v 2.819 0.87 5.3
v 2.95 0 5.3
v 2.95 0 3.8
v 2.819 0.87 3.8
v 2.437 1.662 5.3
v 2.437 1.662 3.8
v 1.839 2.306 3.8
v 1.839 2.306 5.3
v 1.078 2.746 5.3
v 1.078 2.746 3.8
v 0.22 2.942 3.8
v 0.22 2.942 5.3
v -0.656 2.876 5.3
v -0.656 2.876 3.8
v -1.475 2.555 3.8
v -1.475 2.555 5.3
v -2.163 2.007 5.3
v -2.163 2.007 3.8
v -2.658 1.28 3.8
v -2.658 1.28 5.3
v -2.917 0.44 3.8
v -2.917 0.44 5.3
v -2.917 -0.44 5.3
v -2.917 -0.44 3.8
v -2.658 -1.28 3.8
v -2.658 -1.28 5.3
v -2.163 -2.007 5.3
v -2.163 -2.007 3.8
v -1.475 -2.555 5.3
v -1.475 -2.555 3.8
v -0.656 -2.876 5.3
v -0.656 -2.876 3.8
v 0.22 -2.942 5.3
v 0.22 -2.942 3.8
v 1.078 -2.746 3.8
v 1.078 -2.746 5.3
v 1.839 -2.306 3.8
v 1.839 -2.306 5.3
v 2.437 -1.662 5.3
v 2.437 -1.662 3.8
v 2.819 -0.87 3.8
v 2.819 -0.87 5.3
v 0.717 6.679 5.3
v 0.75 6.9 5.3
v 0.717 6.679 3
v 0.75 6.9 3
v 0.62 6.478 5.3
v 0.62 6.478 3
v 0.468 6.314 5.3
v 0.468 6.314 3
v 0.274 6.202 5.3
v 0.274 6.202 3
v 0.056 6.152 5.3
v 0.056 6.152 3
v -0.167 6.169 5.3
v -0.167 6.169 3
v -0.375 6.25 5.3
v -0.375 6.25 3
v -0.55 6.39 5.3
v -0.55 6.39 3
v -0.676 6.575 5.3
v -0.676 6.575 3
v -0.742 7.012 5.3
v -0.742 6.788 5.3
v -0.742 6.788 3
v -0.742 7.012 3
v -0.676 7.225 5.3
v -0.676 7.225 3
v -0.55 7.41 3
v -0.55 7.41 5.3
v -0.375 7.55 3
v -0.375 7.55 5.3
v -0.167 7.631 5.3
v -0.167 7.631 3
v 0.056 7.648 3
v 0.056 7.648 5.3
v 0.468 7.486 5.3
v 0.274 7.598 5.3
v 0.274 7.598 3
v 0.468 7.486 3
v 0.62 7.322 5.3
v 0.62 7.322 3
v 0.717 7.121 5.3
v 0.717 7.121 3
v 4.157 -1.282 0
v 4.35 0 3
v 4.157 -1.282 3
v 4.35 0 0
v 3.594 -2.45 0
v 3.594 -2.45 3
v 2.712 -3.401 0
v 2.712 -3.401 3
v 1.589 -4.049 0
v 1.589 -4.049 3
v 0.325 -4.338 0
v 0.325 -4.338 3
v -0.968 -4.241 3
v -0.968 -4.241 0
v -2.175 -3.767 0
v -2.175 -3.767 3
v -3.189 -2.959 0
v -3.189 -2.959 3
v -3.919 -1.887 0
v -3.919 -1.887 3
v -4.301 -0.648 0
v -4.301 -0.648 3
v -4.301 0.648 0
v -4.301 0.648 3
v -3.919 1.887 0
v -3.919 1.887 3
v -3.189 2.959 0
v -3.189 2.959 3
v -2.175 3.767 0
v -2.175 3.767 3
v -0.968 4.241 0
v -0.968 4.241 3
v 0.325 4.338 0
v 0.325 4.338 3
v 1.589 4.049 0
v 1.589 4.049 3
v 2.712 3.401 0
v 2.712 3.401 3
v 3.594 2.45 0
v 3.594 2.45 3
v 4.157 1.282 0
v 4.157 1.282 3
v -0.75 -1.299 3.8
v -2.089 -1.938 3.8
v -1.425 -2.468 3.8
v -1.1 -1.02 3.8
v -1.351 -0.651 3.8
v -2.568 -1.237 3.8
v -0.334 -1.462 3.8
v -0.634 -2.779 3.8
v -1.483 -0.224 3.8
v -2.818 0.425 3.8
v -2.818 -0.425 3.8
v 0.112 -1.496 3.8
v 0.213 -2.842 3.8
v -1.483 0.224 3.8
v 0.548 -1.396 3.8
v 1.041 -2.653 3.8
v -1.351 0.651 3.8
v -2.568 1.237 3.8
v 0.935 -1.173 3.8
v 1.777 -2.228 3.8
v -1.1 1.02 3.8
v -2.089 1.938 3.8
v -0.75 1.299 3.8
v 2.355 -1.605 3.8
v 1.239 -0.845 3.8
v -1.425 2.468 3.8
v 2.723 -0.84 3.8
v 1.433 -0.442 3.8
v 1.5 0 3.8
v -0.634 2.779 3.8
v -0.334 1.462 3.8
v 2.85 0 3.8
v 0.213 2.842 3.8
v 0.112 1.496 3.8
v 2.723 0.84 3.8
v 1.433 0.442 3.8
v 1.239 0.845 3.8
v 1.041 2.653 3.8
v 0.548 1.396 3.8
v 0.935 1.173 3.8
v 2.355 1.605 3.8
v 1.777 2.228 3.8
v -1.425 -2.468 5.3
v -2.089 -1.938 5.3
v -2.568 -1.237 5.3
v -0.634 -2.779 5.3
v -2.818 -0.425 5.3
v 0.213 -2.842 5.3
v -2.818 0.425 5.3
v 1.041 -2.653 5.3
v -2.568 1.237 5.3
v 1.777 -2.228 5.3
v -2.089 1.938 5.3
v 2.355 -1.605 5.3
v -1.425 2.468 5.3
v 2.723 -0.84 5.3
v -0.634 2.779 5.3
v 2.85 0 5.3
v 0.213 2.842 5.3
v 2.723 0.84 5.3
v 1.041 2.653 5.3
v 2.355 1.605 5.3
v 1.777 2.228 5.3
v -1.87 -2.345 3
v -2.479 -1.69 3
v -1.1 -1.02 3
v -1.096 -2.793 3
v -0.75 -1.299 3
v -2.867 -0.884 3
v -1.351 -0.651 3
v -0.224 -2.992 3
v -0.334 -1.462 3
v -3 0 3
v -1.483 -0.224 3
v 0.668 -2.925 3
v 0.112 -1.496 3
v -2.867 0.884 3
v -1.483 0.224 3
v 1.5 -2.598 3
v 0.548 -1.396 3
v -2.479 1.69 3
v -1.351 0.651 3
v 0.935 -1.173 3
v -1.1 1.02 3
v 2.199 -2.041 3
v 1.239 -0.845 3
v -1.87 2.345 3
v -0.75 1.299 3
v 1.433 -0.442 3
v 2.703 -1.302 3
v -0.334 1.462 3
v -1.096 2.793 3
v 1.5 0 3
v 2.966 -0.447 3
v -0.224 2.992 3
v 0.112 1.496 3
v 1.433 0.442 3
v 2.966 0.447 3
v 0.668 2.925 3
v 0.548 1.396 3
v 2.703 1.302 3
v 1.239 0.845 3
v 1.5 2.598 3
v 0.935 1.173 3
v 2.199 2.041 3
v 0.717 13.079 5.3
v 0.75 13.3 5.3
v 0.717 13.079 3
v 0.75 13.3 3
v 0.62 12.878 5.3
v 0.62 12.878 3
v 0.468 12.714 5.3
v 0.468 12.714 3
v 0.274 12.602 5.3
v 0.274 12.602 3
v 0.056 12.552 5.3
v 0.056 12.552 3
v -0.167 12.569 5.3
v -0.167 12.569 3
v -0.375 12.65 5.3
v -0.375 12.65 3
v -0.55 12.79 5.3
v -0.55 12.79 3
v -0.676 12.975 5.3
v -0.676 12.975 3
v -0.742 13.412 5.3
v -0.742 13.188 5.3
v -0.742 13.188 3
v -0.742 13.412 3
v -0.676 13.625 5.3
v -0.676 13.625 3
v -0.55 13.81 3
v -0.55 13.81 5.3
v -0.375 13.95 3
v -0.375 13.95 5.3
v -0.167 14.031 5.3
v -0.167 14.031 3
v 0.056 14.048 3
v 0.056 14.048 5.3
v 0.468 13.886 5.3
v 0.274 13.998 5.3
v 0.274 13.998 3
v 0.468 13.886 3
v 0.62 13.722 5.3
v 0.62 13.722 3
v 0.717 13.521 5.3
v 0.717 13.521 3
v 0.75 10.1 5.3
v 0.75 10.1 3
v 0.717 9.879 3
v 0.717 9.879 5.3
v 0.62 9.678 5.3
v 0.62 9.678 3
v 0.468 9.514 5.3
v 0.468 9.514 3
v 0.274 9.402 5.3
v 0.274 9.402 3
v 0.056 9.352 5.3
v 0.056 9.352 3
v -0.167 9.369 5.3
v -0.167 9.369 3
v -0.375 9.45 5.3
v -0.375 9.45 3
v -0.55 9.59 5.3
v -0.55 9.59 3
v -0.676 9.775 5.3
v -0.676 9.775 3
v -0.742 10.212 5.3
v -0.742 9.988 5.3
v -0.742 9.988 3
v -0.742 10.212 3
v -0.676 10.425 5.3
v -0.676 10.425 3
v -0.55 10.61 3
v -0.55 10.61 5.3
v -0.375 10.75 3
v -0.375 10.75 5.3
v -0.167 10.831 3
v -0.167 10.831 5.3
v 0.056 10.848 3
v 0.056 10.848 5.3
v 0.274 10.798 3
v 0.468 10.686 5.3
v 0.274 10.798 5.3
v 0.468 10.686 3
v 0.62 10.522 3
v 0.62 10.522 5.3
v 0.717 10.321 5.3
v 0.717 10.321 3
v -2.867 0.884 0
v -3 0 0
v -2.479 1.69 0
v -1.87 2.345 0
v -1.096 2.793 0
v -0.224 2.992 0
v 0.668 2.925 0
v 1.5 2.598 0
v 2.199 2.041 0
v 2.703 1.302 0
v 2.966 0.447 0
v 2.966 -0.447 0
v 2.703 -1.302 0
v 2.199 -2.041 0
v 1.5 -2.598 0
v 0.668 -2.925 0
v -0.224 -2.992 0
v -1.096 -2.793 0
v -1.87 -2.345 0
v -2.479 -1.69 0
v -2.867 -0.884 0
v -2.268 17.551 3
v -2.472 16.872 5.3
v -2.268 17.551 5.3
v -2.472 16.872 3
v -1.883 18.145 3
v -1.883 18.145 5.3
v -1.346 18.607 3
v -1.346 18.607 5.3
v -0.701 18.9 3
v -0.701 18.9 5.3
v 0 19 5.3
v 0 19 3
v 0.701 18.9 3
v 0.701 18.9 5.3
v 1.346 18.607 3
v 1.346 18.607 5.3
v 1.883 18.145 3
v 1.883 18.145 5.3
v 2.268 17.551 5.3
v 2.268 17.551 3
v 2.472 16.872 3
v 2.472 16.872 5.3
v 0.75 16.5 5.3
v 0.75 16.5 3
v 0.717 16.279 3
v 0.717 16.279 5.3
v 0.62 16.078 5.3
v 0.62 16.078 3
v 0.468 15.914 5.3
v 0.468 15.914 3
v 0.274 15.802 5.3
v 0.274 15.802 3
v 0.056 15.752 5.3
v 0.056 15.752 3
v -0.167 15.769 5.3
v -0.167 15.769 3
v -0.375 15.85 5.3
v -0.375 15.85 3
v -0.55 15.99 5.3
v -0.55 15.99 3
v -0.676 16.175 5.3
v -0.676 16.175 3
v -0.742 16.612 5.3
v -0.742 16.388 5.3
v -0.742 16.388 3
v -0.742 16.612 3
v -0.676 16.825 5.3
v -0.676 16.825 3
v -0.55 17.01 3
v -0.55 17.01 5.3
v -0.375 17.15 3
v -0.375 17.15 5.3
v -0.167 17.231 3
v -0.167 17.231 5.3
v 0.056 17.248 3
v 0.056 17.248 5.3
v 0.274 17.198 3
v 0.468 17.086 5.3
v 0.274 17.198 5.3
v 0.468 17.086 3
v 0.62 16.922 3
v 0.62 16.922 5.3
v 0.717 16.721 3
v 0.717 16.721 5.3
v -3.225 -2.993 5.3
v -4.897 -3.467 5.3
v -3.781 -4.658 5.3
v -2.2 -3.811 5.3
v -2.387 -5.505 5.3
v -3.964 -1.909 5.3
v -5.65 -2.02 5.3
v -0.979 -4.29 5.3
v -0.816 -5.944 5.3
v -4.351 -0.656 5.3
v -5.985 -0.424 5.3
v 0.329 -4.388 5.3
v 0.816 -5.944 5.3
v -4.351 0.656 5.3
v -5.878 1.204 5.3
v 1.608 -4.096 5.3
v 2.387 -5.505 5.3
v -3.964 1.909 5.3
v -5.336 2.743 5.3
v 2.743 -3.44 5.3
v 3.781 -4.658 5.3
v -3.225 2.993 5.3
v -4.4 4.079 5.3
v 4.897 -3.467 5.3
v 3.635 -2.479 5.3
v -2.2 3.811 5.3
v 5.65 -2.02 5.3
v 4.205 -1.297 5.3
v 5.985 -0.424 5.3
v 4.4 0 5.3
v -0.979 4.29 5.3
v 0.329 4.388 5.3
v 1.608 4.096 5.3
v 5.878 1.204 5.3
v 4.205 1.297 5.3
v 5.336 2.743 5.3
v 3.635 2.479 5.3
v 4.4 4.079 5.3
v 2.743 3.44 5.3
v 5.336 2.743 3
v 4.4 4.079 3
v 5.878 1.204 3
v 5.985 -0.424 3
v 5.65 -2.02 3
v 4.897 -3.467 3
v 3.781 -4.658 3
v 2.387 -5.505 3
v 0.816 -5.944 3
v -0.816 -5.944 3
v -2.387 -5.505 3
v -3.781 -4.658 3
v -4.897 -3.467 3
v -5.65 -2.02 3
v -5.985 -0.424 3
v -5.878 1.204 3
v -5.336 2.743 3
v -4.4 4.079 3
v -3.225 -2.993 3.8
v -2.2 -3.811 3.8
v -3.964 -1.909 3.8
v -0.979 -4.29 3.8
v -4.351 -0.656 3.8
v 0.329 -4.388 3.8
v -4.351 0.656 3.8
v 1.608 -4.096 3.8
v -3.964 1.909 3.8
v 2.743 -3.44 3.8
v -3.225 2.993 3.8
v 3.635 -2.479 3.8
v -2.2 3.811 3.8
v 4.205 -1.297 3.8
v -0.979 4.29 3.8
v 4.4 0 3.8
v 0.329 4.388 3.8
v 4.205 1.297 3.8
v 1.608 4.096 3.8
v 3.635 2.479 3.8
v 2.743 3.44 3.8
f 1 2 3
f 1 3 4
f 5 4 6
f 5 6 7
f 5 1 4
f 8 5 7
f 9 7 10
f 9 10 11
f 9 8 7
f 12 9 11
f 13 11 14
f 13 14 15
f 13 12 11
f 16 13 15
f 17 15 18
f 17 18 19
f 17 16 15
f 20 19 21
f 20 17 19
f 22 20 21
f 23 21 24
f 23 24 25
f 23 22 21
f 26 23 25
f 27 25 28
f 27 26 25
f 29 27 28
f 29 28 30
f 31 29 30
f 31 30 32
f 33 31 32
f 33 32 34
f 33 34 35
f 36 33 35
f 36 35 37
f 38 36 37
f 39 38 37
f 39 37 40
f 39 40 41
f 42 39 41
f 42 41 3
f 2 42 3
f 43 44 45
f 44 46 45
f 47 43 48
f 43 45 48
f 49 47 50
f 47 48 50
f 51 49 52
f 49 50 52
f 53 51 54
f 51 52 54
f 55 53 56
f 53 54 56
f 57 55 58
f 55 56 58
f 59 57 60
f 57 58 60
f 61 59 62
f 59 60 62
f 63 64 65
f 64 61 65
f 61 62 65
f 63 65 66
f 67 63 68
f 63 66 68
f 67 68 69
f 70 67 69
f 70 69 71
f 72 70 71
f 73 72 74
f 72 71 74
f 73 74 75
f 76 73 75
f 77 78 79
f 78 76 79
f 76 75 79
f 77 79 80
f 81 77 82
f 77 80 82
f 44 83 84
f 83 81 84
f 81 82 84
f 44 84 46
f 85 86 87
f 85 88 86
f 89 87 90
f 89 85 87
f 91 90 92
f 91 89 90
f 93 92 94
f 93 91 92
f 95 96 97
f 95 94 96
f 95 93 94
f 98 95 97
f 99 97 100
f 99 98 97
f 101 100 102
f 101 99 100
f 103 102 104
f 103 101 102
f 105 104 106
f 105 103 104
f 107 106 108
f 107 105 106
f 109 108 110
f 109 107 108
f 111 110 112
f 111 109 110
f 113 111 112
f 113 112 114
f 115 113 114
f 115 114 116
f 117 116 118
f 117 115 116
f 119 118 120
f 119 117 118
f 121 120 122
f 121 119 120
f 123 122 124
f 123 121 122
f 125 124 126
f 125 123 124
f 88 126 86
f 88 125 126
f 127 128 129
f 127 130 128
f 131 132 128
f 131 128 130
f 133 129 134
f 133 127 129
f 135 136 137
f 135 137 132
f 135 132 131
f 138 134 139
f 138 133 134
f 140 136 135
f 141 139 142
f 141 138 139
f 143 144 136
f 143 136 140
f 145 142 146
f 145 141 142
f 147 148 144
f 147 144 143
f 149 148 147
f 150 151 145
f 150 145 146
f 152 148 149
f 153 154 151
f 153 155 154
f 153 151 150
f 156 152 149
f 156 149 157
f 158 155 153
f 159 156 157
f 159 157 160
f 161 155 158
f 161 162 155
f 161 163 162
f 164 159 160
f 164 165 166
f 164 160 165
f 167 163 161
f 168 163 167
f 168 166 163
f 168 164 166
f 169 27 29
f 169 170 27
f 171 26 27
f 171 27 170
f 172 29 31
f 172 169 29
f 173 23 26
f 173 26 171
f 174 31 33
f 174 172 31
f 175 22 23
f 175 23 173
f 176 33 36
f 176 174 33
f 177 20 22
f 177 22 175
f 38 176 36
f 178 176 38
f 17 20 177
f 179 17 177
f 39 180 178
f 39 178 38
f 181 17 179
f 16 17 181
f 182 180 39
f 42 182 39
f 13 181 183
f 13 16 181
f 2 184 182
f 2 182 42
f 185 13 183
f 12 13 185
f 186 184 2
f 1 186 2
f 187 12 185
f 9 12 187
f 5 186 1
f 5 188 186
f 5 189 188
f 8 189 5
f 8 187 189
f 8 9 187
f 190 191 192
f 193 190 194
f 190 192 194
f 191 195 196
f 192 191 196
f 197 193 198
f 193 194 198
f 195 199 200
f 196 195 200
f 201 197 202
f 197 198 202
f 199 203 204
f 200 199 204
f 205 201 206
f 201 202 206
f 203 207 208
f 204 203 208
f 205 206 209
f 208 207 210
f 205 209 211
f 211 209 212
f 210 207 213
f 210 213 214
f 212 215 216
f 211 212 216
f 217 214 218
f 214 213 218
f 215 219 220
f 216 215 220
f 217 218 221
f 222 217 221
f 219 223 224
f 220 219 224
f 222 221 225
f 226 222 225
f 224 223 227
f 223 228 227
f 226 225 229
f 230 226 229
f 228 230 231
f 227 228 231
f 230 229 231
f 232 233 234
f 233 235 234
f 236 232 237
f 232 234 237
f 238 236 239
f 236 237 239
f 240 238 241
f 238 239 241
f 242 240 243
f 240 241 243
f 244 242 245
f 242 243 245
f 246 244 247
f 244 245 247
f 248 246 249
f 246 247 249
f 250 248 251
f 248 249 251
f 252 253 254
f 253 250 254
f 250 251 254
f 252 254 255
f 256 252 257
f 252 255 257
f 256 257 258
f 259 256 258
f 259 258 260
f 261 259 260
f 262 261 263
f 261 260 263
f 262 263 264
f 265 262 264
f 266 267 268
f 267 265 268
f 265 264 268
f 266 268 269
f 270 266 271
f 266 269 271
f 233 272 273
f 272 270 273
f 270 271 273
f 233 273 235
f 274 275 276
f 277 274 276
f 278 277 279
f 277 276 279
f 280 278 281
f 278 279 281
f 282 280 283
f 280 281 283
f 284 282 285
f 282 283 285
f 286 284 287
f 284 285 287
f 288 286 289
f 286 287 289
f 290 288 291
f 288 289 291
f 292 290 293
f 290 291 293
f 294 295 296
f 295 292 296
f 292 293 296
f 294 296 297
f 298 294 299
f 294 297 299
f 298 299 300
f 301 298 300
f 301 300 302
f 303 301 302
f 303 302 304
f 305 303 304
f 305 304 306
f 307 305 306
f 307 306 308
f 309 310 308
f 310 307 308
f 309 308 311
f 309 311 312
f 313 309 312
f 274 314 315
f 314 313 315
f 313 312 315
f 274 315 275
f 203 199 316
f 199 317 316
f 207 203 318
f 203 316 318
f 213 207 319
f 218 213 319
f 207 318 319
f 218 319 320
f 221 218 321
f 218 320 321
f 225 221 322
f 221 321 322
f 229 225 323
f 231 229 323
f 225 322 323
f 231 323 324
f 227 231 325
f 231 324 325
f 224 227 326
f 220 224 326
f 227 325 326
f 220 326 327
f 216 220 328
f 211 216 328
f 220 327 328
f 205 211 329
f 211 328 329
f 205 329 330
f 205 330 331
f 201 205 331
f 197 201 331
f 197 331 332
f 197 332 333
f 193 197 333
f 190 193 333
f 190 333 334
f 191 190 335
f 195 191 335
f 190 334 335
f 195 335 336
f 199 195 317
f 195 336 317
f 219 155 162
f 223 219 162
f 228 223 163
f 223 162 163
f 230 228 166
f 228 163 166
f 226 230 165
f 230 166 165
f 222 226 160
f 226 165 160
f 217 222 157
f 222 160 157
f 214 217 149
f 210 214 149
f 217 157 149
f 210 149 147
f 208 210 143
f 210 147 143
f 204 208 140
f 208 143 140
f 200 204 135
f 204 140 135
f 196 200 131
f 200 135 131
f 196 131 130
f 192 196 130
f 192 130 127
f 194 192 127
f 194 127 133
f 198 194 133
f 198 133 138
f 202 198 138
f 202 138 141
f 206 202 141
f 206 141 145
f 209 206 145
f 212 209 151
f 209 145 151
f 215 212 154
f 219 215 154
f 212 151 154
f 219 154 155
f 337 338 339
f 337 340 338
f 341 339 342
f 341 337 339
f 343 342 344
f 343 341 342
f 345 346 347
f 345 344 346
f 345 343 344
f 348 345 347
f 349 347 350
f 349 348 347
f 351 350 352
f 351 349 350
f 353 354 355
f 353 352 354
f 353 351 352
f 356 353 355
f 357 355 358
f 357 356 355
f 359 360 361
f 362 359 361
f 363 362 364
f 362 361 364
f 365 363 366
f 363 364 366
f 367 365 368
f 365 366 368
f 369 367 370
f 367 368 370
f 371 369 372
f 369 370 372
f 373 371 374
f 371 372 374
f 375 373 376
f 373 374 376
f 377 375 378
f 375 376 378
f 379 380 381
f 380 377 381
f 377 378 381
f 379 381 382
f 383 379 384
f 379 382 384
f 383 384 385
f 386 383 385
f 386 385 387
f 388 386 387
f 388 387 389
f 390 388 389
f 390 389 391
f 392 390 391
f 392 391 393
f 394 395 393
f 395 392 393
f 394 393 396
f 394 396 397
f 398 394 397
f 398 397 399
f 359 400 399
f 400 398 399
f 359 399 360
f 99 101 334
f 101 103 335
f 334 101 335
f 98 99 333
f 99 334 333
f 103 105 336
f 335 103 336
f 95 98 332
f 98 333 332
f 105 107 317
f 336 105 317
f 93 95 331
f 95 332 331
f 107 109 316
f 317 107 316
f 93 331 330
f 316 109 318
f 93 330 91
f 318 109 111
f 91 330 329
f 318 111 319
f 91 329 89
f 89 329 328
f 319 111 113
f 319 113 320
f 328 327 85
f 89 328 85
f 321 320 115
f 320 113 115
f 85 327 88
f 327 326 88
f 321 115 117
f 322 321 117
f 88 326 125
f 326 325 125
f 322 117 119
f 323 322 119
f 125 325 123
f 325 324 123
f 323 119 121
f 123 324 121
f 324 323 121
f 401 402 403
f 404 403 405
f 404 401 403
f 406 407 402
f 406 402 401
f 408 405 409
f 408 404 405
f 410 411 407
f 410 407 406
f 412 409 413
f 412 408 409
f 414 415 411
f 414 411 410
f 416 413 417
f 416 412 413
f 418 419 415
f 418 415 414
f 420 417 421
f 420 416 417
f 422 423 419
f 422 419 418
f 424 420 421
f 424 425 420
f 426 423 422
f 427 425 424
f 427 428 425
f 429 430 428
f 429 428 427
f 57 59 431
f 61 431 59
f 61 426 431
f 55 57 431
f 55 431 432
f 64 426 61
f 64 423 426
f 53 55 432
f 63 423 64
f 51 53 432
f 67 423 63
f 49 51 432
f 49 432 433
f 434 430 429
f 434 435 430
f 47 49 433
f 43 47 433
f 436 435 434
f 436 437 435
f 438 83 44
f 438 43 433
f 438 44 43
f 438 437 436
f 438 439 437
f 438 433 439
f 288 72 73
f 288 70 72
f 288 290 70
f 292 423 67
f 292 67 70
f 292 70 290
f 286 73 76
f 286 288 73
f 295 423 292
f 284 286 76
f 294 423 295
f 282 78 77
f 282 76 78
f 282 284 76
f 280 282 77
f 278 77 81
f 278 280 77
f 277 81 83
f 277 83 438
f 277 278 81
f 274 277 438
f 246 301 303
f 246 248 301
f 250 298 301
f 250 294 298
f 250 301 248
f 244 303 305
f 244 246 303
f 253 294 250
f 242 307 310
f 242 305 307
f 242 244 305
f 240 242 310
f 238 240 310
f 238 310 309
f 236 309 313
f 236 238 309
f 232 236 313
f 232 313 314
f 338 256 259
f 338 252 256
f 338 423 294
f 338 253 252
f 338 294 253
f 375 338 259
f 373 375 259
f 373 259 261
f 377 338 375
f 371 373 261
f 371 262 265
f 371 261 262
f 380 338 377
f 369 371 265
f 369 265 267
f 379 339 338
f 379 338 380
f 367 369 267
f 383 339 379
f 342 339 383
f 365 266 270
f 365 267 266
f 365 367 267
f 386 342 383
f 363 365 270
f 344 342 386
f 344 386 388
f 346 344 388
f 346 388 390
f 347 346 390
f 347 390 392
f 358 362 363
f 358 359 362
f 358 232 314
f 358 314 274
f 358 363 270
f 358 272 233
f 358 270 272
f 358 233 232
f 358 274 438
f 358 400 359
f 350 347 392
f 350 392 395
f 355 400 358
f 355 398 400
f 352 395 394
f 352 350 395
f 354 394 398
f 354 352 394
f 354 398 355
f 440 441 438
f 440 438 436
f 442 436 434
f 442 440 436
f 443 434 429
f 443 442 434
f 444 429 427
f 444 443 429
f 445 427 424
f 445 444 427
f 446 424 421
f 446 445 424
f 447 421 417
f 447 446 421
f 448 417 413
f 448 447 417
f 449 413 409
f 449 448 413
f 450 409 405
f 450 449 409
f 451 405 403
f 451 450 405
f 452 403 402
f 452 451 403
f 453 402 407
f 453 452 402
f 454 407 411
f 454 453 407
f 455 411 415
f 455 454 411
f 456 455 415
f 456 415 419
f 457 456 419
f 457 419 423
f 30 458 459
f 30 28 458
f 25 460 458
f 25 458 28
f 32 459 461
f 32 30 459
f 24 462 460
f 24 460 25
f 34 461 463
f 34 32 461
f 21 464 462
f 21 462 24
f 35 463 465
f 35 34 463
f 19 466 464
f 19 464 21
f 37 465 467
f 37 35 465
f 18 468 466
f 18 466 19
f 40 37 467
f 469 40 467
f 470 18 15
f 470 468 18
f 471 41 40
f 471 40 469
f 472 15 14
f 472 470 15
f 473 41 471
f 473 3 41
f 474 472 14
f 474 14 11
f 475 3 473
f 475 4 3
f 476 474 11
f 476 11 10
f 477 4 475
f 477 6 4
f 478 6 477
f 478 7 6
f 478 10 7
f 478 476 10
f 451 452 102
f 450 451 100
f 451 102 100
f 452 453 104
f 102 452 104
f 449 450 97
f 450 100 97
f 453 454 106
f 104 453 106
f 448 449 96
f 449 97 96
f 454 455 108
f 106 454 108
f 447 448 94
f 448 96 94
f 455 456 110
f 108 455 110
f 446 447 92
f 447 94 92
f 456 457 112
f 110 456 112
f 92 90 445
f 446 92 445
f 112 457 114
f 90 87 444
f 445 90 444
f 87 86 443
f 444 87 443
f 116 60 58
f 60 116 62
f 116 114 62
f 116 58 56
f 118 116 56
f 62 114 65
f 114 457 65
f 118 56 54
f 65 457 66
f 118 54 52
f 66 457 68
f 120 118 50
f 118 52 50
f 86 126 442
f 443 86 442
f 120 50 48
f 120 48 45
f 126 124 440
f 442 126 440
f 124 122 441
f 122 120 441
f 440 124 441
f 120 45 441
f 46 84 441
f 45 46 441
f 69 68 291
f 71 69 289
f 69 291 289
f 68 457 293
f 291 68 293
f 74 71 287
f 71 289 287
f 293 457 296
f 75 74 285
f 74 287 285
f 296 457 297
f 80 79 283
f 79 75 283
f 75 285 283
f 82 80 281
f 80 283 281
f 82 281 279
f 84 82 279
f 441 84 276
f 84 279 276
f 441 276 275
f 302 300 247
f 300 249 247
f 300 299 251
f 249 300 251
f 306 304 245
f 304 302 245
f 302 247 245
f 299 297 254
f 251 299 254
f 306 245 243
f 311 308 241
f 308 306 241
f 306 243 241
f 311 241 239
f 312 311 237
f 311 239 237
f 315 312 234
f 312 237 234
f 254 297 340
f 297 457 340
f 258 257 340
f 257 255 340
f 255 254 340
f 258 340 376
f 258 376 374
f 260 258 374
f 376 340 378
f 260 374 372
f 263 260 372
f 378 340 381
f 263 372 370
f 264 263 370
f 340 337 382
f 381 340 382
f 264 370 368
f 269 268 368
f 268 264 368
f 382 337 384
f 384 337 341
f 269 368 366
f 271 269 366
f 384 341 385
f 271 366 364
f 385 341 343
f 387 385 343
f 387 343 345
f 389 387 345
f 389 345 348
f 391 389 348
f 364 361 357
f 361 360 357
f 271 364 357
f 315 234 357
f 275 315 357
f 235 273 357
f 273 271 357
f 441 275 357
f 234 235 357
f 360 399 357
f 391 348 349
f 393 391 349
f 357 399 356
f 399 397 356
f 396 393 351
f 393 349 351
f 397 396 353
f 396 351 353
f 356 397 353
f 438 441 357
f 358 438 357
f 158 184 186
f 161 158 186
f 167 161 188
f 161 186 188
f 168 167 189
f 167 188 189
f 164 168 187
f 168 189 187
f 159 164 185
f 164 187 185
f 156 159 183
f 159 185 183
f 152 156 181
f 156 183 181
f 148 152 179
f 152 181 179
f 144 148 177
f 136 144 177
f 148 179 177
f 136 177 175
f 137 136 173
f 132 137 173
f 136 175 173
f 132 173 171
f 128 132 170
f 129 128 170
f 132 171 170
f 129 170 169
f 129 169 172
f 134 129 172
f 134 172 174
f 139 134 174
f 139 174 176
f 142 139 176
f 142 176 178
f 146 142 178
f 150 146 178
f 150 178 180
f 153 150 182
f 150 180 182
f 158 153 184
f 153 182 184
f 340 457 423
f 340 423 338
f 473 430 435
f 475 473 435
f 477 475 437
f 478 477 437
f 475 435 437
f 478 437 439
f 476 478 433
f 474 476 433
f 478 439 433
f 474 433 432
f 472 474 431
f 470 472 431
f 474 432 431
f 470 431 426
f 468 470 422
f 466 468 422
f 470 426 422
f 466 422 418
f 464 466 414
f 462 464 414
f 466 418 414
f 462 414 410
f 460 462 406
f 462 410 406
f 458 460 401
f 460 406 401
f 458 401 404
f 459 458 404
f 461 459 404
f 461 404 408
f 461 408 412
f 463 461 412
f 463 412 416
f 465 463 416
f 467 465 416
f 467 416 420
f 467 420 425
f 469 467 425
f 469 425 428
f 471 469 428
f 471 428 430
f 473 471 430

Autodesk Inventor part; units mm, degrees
ref_plane "YZ Plane" through (0, 0, 0) normal (1, 0, 0) x (0, 1, 0)
ref_plane "XZ Plane" through (0, 0, 0) normal (0, 1, 0) x (-1, 0, 0)
ref_plane "XY Plane" through (0, 0, 0) normal (0, 0, 1) x (1, 0, 0)
sketch "Sketch1" plane through (0, 0, 0) normal (0, 0, 1) x (1, 0, 0)
  circle A0 centre (0, 0) radius 4.35
  dimension "d0" = 8.7
extrude "Extrusion1" add sketch "Sketch1" along normal blind 3
sketch "Sketch2" plane through (0, 0, 0) normal (0, 0, -1) x (-1, 0, 0)
  circle A0 centre (0, 0) radius 3
  dimension "d3" = 6
extrude "Extrusion2" cut sketch "Sketch2" against normal up to next
sketch "Sketch3" plane through (0, 0, 3) normal (0, 0, 1) x (1, 0, 0)
  arc A0 (2.4721, 16.8725) -> (-2.4721, 16.8725) centre (0, 16.5) ccw
  line L0 (-4.4, 4.0792) -> (-2.4721, 16.8725)
  line L1 (4.4, 4.0792) -> (2.4721, 16.8725)
  circle A1 centre (0, 16.5) radius 0.75
  circle A2 centre (0, 13.3) radius 0.75
  circle A3 centre (0, 10.1) radius 0.75
  circle A4 centre (0, 6.9) radius 0.75
  arc A5 (-4.4, 4.0792) -> (-4.4, -4.0792) centre (0, 0) ccw
  arc A6 (4.4, -4.0792) -> (4.4, 4.0792) centre (0, 0) ccw
  arc A7 (-4.4, -4.0792) -> (4.4, -4.0792) centre (0, 0) ccw
  dimension "d8" = 8.8
  dimension "d10" = 1.5
  dimension "d13" = 1.5
  dimension "d14" = 1.5
  dimension "d15" = 1.5
extrude "Extrusion3" add sketch "Sketch3" along normal blind 2.3
sketch "Sketch4" plane through (0, 0, 5.3) normal (0, 0, 1) x (1, 0, 0)
  circle A0 centre (0, 0) radius 2.85
  circle A1 centre (0, 0) radius 4.4
  circle A2 centre (0, 0) radius 2.95
  dimension "d22" = 5.7
  dimension "d23" = 8.8
  dimension "d24" = 5.9
extrude "Extrusion4" cut sketch "Sketch4" against normal blind 1.5
sketch "Sketch5" plane through (0, 0, 3.8) normal (0, 0, 1) x (1, 0, 0)
  circle A0 centre (0, 0) radius 1.5
  dimension "d27" = 3
extrude "Extrusion5" cut sketch "Sketch5" against normal up to next
properties part number "Servomotor-1"
